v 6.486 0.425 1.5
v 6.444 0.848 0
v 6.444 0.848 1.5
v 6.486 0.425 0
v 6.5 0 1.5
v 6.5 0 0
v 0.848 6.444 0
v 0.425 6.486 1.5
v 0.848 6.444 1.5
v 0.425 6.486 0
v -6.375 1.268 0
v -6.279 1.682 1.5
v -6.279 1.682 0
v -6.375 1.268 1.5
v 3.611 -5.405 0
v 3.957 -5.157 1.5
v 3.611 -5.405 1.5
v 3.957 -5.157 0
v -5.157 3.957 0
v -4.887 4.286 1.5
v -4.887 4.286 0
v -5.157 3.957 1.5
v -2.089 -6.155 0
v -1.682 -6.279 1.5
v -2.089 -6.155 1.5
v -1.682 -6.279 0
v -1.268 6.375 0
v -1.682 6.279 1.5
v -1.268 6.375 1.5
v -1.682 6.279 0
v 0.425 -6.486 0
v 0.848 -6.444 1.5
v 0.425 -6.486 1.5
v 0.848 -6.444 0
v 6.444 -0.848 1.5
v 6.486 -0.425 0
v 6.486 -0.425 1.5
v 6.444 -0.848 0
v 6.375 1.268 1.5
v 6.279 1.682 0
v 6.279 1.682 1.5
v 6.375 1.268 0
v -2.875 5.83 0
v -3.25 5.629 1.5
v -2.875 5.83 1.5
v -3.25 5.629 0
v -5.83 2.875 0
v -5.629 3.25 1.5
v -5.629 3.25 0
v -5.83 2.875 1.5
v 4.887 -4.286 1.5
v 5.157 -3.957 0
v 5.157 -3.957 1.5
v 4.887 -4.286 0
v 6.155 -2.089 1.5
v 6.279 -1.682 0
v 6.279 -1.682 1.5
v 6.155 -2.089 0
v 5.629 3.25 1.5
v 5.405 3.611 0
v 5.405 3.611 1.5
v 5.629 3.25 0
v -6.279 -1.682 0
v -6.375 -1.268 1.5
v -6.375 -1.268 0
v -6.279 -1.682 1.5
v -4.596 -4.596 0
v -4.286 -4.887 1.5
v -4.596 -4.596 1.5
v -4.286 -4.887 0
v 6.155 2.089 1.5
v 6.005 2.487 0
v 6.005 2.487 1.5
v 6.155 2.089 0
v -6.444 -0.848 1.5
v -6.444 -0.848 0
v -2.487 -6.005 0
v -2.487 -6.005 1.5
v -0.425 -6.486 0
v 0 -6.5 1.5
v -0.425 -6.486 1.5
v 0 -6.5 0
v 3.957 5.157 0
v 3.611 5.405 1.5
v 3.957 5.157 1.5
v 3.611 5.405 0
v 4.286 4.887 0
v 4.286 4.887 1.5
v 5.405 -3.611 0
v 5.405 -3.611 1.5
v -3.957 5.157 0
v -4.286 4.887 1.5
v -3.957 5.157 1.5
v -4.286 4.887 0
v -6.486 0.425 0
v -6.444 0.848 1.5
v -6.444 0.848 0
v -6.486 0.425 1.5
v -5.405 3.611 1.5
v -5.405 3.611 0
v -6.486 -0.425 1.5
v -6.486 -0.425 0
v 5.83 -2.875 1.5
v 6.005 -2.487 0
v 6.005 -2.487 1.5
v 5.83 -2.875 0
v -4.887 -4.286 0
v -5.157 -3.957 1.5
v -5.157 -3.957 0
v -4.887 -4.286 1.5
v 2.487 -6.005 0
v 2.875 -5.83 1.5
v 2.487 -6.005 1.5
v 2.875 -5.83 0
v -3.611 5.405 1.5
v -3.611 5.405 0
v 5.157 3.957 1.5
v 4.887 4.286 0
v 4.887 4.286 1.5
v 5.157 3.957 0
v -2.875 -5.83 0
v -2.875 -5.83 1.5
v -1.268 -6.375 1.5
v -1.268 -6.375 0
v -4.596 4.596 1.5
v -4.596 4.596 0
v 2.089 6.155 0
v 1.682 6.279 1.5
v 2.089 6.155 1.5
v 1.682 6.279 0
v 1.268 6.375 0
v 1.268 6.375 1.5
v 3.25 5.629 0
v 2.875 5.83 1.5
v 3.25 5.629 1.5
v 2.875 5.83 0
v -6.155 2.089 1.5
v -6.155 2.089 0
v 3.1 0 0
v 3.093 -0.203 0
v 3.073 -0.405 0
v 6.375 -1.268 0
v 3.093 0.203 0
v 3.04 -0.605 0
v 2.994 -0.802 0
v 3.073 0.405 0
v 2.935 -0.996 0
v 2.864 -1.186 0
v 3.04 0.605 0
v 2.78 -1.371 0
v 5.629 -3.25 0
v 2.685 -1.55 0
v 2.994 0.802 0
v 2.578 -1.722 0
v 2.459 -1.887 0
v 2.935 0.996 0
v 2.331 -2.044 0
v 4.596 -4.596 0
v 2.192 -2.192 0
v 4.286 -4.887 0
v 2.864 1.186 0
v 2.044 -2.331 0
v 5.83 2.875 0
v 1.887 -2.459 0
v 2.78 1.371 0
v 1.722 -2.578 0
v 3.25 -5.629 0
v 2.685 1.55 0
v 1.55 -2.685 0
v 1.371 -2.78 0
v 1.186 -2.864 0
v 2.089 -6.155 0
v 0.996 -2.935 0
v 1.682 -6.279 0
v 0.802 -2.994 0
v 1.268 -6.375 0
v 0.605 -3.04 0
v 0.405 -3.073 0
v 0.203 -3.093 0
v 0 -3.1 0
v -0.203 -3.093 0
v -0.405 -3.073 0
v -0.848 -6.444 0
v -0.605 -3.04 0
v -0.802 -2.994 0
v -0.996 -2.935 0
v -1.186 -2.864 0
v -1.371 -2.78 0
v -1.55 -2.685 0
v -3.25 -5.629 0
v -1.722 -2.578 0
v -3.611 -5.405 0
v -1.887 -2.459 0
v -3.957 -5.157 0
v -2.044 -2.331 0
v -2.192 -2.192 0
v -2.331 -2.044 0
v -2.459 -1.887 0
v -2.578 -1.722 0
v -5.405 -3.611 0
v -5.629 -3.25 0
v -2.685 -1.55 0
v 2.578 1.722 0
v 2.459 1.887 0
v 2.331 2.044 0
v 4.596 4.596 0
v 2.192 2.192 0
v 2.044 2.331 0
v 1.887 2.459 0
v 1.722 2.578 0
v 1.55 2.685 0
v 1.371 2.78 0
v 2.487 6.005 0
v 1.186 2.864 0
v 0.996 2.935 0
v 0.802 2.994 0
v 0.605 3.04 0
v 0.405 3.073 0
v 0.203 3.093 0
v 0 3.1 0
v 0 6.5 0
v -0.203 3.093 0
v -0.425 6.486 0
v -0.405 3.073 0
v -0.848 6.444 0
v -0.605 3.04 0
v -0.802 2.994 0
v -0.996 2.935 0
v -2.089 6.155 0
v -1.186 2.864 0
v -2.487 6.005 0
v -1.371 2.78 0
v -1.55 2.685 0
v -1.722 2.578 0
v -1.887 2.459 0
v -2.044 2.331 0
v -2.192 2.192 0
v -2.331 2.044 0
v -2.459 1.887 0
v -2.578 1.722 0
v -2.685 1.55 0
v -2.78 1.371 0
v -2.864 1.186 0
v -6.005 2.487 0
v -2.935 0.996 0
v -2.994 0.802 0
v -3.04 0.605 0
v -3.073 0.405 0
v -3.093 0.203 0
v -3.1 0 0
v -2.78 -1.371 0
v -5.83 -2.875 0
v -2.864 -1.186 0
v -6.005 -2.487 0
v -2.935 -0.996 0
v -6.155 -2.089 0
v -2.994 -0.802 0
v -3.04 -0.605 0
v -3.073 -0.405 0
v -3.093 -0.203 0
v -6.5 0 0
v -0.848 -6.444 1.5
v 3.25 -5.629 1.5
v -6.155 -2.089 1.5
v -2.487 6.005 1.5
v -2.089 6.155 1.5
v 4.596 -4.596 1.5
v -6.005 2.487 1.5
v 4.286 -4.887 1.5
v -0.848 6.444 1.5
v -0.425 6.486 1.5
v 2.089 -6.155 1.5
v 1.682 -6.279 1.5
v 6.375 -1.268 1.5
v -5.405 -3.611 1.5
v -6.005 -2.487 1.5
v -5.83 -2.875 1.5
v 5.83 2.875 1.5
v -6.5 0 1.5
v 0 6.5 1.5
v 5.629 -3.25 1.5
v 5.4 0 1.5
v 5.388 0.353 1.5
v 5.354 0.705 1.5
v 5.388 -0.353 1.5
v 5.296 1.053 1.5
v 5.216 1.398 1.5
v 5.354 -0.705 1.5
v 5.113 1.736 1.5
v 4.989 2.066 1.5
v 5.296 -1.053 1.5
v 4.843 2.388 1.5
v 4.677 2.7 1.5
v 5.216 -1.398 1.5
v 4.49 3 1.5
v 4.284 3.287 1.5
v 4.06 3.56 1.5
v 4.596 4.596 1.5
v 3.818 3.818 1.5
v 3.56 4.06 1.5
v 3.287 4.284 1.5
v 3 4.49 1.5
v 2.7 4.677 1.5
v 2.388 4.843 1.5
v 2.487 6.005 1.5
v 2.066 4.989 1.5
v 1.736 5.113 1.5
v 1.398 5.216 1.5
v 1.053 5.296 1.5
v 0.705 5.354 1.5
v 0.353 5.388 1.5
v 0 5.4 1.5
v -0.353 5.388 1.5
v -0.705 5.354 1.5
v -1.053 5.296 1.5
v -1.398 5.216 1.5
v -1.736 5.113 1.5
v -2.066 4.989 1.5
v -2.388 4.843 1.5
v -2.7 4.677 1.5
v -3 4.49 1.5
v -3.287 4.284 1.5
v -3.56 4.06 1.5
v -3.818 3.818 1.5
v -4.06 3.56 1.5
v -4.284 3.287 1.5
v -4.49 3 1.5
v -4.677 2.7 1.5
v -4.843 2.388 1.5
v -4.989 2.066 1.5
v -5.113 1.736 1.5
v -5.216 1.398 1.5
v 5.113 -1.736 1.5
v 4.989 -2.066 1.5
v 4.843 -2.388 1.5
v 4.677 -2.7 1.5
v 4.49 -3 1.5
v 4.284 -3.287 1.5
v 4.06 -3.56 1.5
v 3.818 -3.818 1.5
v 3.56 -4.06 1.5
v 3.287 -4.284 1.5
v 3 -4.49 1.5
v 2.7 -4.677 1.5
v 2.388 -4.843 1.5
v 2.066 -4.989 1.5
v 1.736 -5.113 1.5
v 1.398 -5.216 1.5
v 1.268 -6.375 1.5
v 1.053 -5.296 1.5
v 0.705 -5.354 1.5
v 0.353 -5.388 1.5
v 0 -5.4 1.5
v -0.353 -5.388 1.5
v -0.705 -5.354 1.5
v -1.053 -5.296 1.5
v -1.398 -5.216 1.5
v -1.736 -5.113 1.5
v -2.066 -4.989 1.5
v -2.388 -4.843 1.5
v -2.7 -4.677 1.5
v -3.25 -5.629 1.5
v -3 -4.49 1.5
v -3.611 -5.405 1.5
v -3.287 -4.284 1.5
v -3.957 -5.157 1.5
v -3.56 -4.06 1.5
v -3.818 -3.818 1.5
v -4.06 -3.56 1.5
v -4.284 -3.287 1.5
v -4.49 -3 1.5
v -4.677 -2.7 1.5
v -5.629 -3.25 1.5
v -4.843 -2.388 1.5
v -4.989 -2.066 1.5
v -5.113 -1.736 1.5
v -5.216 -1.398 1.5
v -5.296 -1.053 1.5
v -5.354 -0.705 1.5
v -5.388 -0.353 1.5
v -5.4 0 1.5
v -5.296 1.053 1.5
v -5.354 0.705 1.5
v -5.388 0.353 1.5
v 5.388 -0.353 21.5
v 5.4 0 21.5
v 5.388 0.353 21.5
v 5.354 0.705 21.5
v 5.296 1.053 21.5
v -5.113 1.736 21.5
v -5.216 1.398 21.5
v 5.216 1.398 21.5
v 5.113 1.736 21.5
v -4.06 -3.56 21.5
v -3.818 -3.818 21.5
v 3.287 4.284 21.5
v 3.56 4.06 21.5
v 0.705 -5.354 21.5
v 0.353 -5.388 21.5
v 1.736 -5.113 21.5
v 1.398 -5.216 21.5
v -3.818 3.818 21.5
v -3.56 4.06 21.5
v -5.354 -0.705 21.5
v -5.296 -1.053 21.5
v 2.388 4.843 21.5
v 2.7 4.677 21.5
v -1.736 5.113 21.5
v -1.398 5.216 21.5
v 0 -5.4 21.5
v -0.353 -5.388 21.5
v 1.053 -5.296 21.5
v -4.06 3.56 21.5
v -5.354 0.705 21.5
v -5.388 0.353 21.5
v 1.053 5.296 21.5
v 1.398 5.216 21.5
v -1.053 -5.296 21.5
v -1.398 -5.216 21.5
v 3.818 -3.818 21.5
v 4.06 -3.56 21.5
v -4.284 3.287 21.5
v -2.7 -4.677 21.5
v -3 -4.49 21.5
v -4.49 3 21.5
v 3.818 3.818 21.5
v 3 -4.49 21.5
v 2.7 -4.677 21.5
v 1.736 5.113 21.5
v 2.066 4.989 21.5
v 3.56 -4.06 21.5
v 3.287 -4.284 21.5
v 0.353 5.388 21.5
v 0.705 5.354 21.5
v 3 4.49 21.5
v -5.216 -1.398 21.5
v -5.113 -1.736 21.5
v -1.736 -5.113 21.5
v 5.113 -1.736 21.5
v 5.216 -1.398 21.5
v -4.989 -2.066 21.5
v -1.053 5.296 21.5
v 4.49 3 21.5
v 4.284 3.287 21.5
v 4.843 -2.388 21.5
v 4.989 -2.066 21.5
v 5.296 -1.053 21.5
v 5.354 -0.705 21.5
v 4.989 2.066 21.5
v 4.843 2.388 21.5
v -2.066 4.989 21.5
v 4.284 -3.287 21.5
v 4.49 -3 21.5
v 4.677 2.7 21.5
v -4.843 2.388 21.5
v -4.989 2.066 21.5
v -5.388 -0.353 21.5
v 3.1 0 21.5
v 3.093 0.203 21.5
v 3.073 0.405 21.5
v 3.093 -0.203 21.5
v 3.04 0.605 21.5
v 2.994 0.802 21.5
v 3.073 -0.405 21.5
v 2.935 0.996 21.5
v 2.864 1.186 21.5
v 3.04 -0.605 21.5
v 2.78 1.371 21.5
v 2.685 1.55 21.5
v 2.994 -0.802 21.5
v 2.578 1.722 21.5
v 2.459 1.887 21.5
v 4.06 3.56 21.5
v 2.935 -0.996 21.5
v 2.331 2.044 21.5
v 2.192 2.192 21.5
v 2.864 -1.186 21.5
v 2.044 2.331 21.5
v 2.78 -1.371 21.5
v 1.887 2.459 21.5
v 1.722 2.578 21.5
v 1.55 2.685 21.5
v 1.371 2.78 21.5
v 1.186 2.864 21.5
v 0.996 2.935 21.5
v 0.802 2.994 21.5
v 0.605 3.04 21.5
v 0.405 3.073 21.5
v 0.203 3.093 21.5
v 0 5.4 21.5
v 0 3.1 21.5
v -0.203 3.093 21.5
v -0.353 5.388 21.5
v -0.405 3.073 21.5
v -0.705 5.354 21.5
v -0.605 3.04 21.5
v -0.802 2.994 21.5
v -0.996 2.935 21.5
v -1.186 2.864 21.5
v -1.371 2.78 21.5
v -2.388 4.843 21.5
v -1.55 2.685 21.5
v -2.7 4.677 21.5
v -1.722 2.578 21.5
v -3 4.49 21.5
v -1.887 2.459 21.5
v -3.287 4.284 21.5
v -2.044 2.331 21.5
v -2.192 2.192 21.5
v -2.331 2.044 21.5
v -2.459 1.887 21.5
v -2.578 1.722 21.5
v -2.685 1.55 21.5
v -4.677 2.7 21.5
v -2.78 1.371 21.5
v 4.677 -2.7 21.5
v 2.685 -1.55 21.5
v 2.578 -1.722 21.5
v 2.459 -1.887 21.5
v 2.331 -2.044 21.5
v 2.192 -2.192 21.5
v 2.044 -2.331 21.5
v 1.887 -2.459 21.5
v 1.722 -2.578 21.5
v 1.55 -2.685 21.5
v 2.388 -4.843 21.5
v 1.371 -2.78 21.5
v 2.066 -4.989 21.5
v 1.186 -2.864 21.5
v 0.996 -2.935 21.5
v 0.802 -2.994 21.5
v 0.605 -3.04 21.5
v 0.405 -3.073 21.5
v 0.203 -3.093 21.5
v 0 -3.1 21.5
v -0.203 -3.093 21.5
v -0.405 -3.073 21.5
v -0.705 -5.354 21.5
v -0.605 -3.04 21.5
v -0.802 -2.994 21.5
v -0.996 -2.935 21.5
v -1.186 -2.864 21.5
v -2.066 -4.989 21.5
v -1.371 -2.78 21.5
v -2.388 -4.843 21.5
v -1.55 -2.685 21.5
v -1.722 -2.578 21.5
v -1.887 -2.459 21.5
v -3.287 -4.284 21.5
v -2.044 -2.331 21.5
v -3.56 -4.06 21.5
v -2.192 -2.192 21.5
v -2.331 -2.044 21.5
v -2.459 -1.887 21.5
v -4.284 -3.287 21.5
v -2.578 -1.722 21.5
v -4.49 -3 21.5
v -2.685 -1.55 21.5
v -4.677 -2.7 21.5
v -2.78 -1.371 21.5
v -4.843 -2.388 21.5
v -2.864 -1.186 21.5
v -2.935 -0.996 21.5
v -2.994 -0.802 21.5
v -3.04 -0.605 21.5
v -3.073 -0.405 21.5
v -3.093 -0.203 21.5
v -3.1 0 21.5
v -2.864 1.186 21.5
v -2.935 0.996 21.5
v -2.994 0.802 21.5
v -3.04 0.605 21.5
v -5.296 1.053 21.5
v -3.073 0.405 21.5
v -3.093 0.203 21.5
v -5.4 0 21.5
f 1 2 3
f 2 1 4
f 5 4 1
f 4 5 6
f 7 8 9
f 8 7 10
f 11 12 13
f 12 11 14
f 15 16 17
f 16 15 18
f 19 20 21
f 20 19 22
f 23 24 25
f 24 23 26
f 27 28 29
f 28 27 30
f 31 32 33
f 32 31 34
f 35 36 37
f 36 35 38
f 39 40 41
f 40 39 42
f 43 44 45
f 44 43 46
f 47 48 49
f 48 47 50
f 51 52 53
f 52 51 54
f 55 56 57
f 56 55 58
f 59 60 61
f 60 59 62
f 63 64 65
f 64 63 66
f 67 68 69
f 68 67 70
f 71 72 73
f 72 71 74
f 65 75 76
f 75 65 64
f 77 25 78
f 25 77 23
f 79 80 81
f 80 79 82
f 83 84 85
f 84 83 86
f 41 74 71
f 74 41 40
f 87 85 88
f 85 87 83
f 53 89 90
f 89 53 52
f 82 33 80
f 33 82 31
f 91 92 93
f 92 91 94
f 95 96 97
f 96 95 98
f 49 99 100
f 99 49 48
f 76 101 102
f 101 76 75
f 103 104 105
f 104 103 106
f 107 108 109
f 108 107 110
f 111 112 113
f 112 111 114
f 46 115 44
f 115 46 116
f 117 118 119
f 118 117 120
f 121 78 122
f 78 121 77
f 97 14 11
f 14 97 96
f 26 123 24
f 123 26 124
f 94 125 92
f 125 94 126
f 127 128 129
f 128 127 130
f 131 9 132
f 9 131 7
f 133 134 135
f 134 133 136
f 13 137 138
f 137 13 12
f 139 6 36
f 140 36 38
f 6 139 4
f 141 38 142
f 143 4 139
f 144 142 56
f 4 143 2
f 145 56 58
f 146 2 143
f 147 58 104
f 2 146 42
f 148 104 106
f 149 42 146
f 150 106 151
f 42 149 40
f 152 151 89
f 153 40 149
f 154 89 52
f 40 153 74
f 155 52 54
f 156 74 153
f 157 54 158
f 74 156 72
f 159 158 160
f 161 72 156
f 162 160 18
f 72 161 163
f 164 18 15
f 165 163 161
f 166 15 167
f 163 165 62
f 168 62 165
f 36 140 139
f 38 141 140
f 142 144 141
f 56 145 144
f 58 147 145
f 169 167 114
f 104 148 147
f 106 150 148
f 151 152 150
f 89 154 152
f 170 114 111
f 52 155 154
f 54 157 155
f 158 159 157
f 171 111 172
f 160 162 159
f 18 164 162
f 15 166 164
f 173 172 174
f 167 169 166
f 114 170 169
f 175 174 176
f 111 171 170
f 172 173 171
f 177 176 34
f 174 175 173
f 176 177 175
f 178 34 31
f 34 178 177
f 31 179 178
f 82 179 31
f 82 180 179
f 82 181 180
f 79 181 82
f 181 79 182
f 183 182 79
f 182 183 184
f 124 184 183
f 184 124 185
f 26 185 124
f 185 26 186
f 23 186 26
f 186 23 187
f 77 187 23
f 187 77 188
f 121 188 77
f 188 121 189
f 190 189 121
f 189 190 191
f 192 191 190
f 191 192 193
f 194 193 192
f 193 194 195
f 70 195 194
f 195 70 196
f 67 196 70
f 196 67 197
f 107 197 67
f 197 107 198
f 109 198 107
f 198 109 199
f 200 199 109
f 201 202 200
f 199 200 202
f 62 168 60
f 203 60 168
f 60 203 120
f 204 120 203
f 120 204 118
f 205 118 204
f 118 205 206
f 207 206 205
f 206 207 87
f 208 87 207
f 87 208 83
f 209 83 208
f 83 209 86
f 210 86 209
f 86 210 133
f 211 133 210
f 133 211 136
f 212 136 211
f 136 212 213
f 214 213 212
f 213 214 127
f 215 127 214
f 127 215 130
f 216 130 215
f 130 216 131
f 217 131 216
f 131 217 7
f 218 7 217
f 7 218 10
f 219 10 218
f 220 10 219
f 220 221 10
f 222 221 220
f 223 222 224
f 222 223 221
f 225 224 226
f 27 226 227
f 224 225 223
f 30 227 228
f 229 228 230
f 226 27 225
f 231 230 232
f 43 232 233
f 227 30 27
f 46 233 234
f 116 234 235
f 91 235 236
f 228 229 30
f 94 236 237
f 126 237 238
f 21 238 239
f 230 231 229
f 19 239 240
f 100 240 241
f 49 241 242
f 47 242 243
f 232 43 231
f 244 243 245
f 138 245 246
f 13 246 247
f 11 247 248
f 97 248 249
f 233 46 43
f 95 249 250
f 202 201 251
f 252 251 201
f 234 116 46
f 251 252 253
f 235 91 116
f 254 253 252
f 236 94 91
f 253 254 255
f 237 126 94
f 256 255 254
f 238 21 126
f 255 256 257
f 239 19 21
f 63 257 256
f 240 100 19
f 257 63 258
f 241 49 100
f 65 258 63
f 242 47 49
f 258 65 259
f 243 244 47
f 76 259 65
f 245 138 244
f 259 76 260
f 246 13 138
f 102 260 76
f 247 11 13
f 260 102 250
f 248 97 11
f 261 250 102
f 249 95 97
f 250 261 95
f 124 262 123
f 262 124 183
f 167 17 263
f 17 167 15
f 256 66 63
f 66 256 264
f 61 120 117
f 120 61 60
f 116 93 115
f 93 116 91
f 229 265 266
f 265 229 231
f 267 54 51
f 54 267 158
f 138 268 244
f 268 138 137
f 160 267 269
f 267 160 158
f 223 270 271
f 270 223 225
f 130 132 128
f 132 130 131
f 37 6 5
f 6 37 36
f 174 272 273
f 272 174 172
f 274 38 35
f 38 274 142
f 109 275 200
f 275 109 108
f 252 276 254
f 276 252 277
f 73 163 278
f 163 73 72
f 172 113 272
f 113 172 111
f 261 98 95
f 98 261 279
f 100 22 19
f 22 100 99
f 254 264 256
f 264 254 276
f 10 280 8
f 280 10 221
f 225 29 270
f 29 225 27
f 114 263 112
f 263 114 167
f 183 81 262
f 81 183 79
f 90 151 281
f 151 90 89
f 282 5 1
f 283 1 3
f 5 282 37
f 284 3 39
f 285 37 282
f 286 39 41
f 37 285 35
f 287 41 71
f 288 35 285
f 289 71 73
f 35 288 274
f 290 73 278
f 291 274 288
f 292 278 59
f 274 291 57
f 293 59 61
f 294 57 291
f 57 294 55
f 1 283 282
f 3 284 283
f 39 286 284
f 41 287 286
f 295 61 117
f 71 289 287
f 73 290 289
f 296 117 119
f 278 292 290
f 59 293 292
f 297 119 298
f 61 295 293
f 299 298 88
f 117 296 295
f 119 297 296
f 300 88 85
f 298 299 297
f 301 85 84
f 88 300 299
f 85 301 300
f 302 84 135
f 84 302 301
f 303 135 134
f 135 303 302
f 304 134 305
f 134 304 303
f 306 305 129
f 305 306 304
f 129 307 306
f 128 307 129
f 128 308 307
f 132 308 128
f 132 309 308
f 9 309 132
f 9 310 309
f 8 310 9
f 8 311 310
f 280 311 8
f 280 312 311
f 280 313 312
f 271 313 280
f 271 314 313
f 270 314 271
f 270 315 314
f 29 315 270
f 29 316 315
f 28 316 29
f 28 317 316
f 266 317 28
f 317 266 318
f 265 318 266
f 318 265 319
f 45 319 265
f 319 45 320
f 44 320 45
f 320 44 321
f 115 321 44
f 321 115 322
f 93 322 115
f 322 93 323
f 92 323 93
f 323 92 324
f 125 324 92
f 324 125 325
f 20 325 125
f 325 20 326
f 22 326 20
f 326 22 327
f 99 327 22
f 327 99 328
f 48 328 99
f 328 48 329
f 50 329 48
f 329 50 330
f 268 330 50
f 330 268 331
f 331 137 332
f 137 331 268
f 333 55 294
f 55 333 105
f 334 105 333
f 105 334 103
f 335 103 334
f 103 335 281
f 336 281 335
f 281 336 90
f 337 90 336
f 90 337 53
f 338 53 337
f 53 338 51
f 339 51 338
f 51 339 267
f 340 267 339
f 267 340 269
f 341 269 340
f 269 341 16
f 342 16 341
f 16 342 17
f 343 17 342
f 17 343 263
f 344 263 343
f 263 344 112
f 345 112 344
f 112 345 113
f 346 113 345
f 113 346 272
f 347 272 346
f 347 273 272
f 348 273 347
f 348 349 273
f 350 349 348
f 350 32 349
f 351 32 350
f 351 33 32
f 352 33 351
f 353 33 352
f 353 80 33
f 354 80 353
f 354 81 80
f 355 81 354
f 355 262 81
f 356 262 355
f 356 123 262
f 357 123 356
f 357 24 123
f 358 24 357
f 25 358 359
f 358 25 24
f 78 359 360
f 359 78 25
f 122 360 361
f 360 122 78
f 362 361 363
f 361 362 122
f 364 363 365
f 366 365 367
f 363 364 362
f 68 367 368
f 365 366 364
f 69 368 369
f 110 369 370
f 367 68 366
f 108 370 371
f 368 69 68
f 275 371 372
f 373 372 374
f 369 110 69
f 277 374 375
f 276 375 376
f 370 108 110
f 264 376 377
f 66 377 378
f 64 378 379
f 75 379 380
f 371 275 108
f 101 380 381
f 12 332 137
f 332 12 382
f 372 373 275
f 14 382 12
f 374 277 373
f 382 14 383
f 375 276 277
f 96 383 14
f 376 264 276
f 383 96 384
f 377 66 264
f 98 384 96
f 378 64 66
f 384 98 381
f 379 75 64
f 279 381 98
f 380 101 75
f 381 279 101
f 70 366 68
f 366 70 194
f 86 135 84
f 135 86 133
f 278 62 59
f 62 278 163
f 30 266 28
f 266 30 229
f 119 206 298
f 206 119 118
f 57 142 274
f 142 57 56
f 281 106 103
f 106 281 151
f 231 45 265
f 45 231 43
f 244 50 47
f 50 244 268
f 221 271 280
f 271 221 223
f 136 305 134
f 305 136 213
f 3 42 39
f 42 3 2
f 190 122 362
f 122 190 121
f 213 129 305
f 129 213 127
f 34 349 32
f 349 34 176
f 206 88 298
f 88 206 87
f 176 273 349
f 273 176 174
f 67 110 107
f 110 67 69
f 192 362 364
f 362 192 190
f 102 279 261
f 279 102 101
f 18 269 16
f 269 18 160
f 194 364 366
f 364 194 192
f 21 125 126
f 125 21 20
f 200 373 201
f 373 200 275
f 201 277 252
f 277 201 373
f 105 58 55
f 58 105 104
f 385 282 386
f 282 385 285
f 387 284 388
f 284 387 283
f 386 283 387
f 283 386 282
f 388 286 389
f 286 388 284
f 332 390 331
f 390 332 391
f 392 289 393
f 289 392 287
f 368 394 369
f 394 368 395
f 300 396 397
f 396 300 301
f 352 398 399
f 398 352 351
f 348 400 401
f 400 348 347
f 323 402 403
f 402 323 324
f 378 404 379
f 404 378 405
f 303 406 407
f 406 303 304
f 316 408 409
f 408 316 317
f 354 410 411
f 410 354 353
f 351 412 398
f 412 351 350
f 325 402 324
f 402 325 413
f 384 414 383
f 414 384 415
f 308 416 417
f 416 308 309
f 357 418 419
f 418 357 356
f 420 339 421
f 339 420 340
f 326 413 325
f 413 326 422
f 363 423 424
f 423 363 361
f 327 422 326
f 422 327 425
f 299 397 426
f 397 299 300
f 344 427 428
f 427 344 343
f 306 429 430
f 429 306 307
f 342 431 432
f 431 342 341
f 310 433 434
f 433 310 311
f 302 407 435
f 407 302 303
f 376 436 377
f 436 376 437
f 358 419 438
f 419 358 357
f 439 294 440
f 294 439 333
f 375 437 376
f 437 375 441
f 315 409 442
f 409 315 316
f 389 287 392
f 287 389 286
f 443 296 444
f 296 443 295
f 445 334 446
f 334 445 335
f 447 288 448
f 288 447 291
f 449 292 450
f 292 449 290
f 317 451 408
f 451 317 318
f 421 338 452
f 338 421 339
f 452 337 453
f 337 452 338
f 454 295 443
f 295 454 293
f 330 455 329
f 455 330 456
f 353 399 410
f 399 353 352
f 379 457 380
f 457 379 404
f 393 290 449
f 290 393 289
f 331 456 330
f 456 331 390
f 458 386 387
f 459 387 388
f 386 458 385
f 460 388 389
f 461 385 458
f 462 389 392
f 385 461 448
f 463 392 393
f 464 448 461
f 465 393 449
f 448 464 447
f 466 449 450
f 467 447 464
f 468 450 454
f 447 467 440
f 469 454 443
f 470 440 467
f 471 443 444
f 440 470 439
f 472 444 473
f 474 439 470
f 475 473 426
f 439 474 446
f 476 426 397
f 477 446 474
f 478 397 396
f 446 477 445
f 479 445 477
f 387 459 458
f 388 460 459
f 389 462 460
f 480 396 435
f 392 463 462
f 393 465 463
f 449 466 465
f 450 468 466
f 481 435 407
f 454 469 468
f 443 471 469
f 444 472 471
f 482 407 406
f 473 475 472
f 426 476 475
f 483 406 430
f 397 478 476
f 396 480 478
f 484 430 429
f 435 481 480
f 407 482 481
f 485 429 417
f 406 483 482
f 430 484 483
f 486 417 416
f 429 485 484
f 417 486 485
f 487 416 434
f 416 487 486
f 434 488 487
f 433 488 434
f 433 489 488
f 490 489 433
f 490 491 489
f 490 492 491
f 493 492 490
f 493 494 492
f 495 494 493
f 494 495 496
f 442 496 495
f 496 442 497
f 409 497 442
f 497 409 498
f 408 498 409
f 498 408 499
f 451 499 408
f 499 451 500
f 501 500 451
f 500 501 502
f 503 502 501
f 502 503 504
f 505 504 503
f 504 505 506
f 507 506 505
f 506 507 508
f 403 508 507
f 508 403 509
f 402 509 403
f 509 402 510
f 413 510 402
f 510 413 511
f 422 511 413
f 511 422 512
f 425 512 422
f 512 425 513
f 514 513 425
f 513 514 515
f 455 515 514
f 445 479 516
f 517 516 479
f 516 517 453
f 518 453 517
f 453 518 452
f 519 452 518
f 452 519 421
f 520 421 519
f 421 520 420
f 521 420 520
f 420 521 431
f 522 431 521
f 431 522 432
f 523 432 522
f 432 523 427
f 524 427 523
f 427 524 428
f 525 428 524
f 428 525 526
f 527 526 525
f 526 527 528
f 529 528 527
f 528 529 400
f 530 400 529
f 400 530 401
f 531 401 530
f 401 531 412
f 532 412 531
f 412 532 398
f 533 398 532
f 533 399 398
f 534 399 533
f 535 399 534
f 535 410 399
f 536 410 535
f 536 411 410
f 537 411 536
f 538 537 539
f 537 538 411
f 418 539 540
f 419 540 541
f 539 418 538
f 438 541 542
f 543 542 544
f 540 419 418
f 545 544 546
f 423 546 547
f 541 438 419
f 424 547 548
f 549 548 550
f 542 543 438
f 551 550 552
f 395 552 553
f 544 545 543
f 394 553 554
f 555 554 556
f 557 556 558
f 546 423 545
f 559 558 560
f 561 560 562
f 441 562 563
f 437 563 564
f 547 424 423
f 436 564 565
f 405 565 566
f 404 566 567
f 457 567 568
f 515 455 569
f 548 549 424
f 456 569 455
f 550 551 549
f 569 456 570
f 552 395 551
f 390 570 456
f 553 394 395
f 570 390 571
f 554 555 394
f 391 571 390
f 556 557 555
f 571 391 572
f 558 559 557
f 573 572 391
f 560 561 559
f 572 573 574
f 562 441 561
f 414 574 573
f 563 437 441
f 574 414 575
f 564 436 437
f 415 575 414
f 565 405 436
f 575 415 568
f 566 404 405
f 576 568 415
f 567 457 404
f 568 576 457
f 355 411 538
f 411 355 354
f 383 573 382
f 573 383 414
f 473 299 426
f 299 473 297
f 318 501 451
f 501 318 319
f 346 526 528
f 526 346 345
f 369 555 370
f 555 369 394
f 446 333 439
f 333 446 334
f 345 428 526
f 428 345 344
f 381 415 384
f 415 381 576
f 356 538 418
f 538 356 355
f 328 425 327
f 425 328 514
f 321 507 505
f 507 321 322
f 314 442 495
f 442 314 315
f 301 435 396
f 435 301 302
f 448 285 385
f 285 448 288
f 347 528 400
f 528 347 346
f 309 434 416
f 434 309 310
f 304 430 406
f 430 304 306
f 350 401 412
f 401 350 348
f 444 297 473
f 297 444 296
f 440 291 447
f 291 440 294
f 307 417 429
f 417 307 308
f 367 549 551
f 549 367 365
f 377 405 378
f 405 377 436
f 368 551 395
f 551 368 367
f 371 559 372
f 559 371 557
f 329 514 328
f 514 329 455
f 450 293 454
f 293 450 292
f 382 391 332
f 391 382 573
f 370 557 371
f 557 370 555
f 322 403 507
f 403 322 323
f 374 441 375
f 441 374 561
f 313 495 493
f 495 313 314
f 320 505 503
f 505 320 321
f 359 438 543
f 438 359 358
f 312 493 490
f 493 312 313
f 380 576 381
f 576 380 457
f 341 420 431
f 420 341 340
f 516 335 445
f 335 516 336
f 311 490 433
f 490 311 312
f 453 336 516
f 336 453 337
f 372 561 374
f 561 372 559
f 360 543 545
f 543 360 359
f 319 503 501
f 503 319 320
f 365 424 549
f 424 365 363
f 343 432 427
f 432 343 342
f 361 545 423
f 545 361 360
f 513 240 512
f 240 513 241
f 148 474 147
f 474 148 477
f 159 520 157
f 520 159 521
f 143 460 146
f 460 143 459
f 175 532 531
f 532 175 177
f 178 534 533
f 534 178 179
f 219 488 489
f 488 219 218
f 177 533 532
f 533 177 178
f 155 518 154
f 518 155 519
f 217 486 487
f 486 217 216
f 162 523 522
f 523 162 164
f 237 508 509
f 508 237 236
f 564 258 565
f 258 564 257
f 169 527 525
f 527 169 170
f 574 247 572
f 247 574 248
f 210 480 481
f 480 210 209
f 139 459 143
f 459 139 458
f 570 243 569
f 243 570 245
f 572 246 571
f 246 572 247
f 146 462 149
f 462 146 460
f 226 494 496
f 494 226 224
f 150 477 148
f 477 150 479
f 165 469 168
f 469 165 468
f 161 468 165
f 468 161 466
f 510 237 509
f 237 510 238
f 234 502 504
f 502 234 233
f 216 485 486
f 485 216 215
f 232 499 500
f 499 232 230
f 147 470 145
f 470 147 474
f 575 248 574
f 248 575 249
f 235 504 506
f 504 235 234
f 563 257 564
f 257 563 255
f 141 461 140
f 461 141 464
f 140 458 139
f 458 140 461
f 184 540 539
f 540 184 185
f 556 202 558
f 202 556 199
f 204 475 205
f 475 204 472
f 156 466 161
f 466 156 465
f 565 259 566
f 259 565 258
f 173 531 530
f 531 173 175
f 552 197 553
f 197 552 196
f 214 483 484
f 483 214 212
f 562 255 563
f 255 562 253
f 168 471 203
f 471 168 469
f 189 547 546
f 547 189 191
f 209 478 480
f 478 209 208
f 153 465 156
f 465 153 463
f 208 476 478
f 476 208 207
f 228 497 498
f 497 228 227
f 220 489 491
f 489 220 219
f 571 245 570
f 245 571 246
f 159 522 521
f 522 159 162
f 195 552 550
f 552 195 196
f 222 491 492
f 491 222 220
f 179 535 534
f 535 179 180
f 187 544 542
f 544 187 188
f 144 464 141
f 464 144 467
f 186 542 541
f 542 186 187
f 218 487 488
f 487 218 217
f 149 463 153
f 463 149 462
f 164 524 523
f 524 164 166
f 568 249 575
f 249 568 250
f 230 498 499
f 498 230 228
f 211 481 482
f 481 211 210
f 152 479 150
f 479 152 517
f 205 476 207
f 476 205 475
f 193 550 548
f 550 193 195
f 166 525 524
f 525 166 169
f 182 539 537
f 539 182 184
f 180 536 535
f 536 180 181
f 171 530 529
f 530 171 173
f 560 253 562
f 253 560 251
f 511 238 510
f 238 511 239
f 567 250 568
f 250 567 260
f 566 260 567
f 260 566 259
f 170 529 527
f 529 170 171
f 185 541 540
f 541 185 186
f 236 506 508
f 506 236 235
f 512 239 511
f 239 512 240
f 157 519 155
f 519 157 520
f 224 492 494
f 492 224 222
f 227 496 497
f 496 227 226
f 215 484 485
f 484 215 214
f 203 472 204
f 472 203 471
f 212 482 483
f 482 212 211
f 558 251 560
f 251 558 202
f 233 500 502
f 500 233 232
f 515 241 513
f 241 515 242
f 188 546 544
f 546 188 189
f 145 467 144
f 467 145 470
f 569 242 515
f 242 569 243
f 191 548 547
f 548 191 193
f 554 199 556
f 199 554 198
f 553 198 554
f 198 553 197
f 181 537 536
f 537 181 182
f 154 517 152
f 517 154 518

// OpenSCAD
// Adapter sleeve: 0.2 mL PCR tube in a 1.5 mL tube rack hole
// Printed upside down: collar on the bed, sleeve body rising upward.

$fn = 96;

// --- Dimensions (mm) ---
collar_d      = 13;    // collar outer diameter
collar_h      = 1.5;   // collar thickness (z = 0 to 1.5)
body_d        = 10.8;  // sleeve body outer diameter
total_h       = 21.5;  // overall height (top of sleeve body)
bore_d        = 6.2;   // straight through-bore diameter
eps           = 0.5;   // cutter overshoot past faces

difference() {
    union() {
        // Collar lying on the bed
        cylinder(d = collar_d, h = collar_h);
        // Sleeve body rising from the collar to total height
        translate([0, 0, collar_h - 0.01])
            cylinder(d = body_d, h = total_h - collar_h + 0.01);
    }
    // Through-bore, open at both ends
    translate([0, 0, -eps])
        cylinder(d = bore_d, h = total_h + 2 * eps);
}
